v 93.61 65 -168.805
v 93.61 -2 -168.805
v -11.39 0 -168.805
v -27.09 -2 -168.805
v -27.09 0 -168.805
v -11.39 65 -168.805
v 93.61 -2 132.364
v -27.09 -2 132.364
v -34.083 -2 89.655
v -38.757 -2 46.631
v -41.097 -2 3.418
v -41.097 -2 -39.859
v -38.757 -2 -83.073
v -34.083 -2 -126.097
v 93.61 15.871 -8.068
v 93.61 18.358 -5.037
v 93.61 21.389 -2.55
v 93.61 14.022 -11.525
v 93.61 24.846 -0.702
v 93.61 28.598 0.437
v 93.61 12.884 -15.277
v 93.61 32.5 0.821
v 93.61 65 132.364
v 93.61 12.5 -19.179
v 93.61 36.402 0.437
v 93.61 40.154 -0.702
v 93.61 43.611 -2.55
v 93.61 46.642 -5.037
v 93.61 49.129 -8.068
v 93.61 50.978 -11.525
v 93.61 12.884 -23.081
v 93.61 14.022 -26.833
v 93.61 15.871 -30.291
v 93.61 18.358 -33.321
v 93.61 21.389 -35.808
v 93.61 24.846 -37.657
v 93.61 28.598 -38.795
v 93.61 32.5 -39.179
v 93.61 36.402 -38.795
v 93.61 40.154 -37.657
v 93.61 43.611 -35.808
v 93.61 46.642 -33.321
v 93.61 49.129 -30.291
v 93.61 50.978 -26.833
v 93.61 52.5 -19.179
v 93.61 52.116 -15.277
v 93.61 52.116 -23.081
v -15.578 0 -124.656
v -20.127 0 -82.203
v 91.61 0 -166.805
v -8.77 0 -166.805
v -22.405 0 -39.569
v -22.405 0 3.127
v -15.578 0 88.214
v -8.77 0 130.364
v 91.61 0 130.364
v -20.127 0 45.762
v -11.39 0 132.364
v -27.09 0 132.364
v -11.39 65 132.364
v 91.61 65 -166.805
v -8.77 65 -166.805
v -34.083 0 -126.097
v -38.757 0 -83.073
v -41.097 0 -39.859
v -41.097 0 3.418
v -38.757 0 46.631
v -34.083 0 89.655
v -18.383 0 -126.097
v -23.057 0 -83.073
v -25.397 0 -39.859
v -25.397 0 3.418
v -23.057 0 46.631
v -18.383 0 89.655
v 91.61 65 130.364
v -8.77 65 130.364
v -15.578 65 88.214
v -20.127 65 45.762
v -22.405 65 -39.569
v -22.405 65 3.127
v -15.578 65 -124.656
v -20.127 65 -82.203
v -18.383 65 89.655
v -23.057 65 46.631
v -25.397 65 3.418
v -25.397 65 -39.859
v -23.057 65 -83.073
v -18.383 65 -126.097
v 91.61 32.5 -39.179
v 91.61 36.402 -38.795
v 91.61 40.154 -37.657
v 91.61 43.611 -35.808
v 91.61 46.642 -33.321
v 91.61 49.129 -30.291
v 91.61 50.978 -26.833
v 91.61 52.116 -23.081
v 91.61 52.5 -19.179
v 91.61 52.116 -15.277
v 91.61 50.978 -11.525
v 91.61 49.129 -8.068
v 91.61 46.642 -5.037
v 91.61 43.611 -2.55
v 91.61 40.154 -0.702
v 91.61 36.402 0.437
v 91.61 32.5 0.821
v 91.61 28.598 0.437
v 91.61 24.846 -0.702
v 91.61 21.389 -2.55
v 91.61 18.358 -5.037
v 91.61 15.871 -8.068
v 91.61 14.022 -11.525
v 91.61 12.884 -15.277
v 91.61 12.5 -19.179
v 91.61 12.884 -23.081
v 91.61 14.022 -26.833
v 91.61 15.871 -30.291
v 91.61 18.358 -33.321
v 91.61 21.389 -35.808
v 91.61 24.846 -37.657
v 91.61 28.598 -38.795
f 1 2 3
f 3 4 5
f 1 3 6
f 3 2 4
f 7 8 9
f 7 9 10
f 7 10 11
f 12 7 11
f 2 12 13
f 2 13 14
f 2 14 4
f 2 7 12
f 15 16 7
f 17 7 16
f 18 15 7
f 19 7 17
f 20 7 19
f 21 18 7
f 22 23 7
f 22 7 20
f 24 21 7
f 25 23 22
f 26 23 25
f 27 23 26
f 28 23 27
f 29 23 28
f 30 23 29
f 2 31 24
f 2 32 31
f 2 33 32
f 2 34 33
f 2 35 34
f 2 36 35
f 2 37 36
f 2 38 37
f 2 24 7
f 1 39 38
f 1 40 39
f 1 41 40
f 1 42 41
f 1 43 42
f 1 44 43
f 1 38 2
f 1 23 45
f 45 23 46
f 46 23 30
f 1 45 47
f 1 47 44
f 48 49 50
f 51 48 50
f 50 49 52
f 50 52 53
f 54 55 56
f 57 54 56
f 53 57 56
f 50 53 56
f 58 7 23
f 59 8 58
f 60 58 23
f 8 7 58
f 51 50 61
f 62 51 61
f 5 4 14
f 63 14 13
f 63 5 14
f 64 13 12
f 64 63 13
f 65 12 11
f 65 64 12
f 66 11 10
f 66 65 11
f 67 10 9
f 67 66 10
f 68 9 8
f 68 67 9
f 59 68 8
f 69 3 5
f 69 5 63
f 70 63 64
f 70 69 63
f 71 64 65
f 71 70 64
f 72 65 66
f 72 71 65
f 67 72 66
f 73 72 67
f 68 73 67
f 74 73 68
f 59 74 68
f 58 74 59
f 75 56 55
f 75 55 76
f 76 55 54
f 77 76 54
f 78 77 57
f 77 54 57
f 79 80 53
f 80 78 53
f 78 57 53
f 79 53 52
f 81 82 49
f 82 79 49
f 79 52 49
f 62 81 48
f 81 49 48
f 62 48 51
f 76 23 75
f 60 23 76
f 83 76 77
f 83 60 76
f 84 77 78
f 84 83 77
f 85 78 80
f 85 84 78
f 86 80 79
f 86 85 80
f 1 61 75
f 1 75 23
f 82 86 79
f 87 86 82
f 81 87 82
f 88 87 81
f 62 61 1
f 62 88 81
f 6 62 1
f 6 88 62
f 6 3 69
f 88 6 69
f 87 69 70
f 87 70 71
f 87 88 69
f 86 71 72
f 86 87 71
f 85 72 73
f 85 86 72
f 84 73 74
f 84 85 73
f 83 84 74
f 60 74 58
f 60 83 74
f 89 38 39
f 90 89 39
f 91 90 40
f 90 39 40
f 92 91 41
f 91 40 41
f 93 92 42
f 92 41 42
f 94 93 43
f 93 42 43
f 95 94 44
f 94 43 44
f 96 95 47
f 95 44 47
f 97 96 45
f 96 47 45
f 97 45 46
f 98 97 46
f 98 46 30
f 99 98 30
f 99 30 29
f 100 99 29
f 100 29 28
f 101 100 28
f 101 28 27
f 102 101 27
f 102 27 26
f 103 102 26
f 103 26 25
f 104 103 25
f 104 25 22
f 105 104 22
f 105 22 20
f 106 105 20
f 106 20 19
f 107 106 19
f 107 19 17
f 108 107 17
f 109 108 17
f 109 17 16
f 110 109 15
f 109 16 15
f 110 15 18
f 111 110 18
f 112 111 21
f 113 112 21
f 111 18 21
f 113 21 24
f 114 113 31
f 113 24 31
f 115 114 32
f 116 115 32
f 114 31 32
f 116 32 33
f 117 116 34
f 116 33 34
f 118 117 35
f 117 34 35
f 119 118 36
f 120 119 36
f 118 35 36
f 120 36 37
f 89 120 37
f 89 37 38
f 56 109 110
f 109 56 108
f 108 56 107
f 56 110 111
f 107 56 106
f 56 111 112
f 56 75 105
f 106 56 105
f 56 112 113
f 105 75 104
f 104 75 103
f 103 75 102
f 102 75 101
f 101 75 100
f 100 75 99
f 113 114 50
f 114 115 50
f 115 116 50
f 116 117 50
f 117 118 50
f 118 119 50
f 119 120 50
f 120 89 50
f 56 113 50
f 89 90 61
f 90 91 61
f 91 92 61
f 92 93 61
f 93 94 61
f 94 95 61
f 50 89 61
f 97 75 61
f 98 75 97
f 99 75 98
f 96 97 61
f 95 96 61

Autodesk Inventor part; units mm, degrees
ref_plane "YZ Plane" through (0, 0, 0) normal (1, 0, 0) x (0, 1, 0)
ref_plane "XZ Plane" through (0, 0, 0) normal (0, 1, 0) x (-1, 0, 0)
ref_plane "XY Plane" through (0, 0, 0) normal (0, 0, 1) x (1, 0, 0)
sketch "Esquisse1" plane through (0, 0, 0) normal (0, 1, 0) x (-1, 0, 0)
  arc A0 (8.3897, -168.8053) -> (8.3897, 132.3637) centre (-777.3166, -18.2208) ccw
  arc A1 (11.3897, -168.8053) -> (11.3897, 132.3637) centre (-774.3166, -18.2208) ccw
  line L0 (11.3897, 132.3637) -> (8.3897, 132.3637)
  line L1 (11.3897, -168.8053) -> (8.3897, -168.8053)
  point P0 (0, 0)
  dimension "d0" = 301.169
extrude "Extrusion1" add sketch "Esquisse1" along normal blind 65
sketch "Esquisse2" plane through (-11.3897, 0, 132.3637) normal (0, 0, 1) x (1, 0, 0)
  line L0 (0, 65) -> (3, 65) projected
  line L1 (0, 0) -> (3, 0) projected
  line L2 (0, 65) -> (3, 65)
  line L3 (3, 65) -> (3, 0)
  line L4 (3, 0) -> (0, 0)
  line L5 (0, 0) -> (0, 65)
  point P0 (11.3897, 0)
extrude "Extrusion2" add sketch "Esquisse2" along normal blind 10
sketch "Esquisse3" plane through (-8.3897, 0, -168.8053) normal (0, 0, -1) x (-1, 0, 0)
  line L0 (0, 0) -> (3, 0) projected
  line L1 (3, 0) -> (3, 65) projected
  line L2 (0, 0) -> (3, 0)
  line L3 (3, 0) -> (3, 65)
  line L4 (3, 65) -> (0, 65)
  line L5 (0, 65) -> (0, 0)
  point P0 (-8.3897, 0)
extrude "Extrusion3" add sketch "Esquisse3" along normal blind 10
sketch "Esquisse4" plane through (-8.3897, 0, 132.3637) normal (1, 0, 0) x (0, 0, -1)
  line L0 (0, 65) -> (-10, 65) projected
  line L1 (-10, 65) -> (-8, 65)
  line L2 (-8, 65) -> (-8, 0)
  line L3 (-8, 0) -> (-10, 0)
  line L4 (-10, 0) -> (-10, 65)
  line L5 (301.169, 0) -> (311.169, 0) projected
  line L6 (301.169, 65) -> (311.169, 65) projected
  line L7 (311.169, 0) -> (309.169, 0)
  line L8 (309.169, 0) -> (309.169, 65)
  line L9 (309.169, 65) -> (311.169, 65)
  line L10 (311.169, 65) -> (311.169, 0)
  point P0 (132.3637, 0)
  point P1 (309.169, 0)
  dimension "d10" = 2
  dimension "d11" = 2
extrude "Extrusion4" add sketch "Esquisse4" along normal blind 100
sketch "Esquisse5" plane through (0, 0, 0) normal (0, -1, 0) x (1, 0, 0)
  line L0 (91.6103, 140.3637) -> (91.6103, 142.3637) projected
  line L1 (-11.3897, 142.3637) -> (91.6103, 142.3637) projected
  line L2 (91.6103, 142.3637) -> (-11.3897, 142.3637)
  line L3 (-11.3897, 132.3637) -> (-11.3897, 142.3637) projected
  line L4 (-11.3897, 142.3637) -> (-11.3897, 132.3637)
  line L5 (91.6103, -176.8053) -> (91.6103, -178.8053) projected
  line L6 (91.6103, 142.3637) -> (91.6103, -178.8053)
  line L7 (-11.3897, -178.8053) -> (91.6103, -178.8053) projected
  line L8 (91.6103, -178.8053) -> (-11.3897, -178.8053)
  line L9 (-11.3897, -168.8053) -> (-11.3897, -178.8053) projected
  line L10 (-11.3897, -178.8053) -> (-11.3897, -168.8053)
  arc A0 (-11.3897, 132.3637) -> (-11.3897, -168.8053) centre (774.3166, -18.2208) ccw
  point P0 (0, 0)
extrude "Extrusion5" add sketch "Esquisse5" along normal blind 2
sketch "Esquisse7" plane through (91.6103, 0, 132.3637) normal (1, 0, 0) x (0, 0, -1)
  line L0 (301.169, -2) -> (311.169, -2) projected
  line L1 (-10, 65) -> (311.169, 65)
  line L2 (311.169, 65) -> (311.169, -2)
  line L3 (311.169, -2) -> (-10, -2)
  line L4 (-10, -2) -> (-10, 65)
  point P0 (132.3637, 0)
extrude "Extrusion6" add sketch "Esquisse7" along normal blind 2
sketch "Esquisse8" plane through (-11.3897, 65, -178.8053) normal (-1, 0, 0) x (0, 0, 1)
  line L0 (0, 0) -> (0, -67) projected
  line L1 (321.169, -67) -> (0, -67) projected
  line L2 (0, -65) -> (321.169, -65)
  line L3 (321.169, -65) -> (321.169, -67)
  line L4 (321.169, -67) -> (0, -67)
  line L5 (0, -67) -> (0, -65)
  point P0 (178.8053, -65)
extrude "Extrusion7" add sketch "Esquisse8" along normal blind 30
sketch "Esquisse9" plane through (-11.3897, 0, -168.8053) normal (0, 1, 0) x (1, 0, 0)
  arc A0 (0, 0) -> (0, -301.169) centre (785.7064, -150.5845) ccw projected
  line L0 (0, 0) -> (0, -301.169)
  line L1 (-30, -311.169) -> (-30, 10) projected
  arc A1 (-15.7, 0) -> (-15.7, -301.169) centre (770.0064, -150.5845) ccw
  line L2 (-15.7, 0) -> (0, 0)
  line L3 (-15.7, -301.169) -> (0, -301.169)
  line L4 (0, -301.169) -> (0, -311.169) projected
  arc A2 (0, 0) -> (0, -301.169) centre (785.7064, -150.5845) ccw
  line L5 (0, 0) -> (0, 10) projected
  line L6 (0, 0) -> (0, 10)
  line L7 (-30, 10) -> (-30, -311.169) projected
  line L8 (0, 10) -> (-30, 10)
  line L9 (-30, 10) -> (-30, -311.169)
  line L10 (0, -311.169) -> (-30, -311.169) projected
  line L11 (0, -311.169) -> (0, -301.169)
  point P0 (11.3897, -168.8053)
  point P1 (-30, -150.5845)
extrude "Extrusion8" cut sketch "Esquisse9" against normal through all contours L2 A1 L1 L8 L5 | L4 L10 L1 A1 L3
sketch "Esquisse10" plane through (93.6103, 0, 132.3637) normal (1, 0, 0) x (0, 0, -1)
  circle A0 centre (151.5428, 32.5) radius 20
  line L0 (311.169, 65) -> (-10, 65) projected
  point P0 (132.3637, 0)
  dimension "d36" = 40
  dimension "d37" = 32.5
extrude "Extrusion9" cut sketch "Esquisse10" against normal blind 10
sketch "Esquisse11" plane through (-11.3897, 65, -178.8053) normal (-1, 0, 0) x (0, 0, 1)
  line L0 (10, -65) -> (10, 0) projected
  line L1 (10, 0) -> (-34.2459, 0)
  line L2 (-34.2459, 0) -> (-34.2459, -126.8111)
  line L3 (-34.2459, -126.8111) -> (10, -126.8111)
  line L4 (10, -126.8111) -> (10, 0)
  line L5 (311.169, -65) -> (311.169, 0) projected
  line L6 (311.169, 0) -> (416.0548, 0)
  line L7 (416.0548, 0) -> (416.0548, -178.3642)
  line L8 (416.0548, -178.3642) -> (311.169, -178.3642)
  line L9 (311.169, -178.3642) -> (311.169, 0)
  point P0 (178.8053, -65)
extrude "Extrusion10" cut sketch "Esquisse11" against normal through all
sketch "Esquisse12" plane through (91.6103, 0, 132.3637) normal (-1, 0, 0) x (0, 0, 1)
  line L0 (-301.169, 0) -> (0, 0) projected
  line L1 (-301.169, 65) -> (0, 65) projected
  line L2 (-301.169, 0) -> (-299.169, 0)
  line L3 (-299.169, 0) -> (-299.169, 65)
  line L4 (-299.169, 65) -> (-301.169, 65)
  line L5 (-301.169, 65) -> (-301.169, 0)
  line L6 (0, 0) -> (-2, 0)
  line L7 (-2, 0) -> (-2, 65)
  line L8 (-2, 65) -> (0, 65)
  line L9 (0, 65) -> (0, 0)
  point P0 (-132.3637, 0)
  point P1 (-2, 0)
  dimension "d42" = 2
  dimension "d43" = 2
extrude "Extrusion11" add sketch "Esquisse12" along normal up to surface contours L5 L1 L3 L0 | L7 L1 L9 L0
properties part number "pièce_fixe_station"
